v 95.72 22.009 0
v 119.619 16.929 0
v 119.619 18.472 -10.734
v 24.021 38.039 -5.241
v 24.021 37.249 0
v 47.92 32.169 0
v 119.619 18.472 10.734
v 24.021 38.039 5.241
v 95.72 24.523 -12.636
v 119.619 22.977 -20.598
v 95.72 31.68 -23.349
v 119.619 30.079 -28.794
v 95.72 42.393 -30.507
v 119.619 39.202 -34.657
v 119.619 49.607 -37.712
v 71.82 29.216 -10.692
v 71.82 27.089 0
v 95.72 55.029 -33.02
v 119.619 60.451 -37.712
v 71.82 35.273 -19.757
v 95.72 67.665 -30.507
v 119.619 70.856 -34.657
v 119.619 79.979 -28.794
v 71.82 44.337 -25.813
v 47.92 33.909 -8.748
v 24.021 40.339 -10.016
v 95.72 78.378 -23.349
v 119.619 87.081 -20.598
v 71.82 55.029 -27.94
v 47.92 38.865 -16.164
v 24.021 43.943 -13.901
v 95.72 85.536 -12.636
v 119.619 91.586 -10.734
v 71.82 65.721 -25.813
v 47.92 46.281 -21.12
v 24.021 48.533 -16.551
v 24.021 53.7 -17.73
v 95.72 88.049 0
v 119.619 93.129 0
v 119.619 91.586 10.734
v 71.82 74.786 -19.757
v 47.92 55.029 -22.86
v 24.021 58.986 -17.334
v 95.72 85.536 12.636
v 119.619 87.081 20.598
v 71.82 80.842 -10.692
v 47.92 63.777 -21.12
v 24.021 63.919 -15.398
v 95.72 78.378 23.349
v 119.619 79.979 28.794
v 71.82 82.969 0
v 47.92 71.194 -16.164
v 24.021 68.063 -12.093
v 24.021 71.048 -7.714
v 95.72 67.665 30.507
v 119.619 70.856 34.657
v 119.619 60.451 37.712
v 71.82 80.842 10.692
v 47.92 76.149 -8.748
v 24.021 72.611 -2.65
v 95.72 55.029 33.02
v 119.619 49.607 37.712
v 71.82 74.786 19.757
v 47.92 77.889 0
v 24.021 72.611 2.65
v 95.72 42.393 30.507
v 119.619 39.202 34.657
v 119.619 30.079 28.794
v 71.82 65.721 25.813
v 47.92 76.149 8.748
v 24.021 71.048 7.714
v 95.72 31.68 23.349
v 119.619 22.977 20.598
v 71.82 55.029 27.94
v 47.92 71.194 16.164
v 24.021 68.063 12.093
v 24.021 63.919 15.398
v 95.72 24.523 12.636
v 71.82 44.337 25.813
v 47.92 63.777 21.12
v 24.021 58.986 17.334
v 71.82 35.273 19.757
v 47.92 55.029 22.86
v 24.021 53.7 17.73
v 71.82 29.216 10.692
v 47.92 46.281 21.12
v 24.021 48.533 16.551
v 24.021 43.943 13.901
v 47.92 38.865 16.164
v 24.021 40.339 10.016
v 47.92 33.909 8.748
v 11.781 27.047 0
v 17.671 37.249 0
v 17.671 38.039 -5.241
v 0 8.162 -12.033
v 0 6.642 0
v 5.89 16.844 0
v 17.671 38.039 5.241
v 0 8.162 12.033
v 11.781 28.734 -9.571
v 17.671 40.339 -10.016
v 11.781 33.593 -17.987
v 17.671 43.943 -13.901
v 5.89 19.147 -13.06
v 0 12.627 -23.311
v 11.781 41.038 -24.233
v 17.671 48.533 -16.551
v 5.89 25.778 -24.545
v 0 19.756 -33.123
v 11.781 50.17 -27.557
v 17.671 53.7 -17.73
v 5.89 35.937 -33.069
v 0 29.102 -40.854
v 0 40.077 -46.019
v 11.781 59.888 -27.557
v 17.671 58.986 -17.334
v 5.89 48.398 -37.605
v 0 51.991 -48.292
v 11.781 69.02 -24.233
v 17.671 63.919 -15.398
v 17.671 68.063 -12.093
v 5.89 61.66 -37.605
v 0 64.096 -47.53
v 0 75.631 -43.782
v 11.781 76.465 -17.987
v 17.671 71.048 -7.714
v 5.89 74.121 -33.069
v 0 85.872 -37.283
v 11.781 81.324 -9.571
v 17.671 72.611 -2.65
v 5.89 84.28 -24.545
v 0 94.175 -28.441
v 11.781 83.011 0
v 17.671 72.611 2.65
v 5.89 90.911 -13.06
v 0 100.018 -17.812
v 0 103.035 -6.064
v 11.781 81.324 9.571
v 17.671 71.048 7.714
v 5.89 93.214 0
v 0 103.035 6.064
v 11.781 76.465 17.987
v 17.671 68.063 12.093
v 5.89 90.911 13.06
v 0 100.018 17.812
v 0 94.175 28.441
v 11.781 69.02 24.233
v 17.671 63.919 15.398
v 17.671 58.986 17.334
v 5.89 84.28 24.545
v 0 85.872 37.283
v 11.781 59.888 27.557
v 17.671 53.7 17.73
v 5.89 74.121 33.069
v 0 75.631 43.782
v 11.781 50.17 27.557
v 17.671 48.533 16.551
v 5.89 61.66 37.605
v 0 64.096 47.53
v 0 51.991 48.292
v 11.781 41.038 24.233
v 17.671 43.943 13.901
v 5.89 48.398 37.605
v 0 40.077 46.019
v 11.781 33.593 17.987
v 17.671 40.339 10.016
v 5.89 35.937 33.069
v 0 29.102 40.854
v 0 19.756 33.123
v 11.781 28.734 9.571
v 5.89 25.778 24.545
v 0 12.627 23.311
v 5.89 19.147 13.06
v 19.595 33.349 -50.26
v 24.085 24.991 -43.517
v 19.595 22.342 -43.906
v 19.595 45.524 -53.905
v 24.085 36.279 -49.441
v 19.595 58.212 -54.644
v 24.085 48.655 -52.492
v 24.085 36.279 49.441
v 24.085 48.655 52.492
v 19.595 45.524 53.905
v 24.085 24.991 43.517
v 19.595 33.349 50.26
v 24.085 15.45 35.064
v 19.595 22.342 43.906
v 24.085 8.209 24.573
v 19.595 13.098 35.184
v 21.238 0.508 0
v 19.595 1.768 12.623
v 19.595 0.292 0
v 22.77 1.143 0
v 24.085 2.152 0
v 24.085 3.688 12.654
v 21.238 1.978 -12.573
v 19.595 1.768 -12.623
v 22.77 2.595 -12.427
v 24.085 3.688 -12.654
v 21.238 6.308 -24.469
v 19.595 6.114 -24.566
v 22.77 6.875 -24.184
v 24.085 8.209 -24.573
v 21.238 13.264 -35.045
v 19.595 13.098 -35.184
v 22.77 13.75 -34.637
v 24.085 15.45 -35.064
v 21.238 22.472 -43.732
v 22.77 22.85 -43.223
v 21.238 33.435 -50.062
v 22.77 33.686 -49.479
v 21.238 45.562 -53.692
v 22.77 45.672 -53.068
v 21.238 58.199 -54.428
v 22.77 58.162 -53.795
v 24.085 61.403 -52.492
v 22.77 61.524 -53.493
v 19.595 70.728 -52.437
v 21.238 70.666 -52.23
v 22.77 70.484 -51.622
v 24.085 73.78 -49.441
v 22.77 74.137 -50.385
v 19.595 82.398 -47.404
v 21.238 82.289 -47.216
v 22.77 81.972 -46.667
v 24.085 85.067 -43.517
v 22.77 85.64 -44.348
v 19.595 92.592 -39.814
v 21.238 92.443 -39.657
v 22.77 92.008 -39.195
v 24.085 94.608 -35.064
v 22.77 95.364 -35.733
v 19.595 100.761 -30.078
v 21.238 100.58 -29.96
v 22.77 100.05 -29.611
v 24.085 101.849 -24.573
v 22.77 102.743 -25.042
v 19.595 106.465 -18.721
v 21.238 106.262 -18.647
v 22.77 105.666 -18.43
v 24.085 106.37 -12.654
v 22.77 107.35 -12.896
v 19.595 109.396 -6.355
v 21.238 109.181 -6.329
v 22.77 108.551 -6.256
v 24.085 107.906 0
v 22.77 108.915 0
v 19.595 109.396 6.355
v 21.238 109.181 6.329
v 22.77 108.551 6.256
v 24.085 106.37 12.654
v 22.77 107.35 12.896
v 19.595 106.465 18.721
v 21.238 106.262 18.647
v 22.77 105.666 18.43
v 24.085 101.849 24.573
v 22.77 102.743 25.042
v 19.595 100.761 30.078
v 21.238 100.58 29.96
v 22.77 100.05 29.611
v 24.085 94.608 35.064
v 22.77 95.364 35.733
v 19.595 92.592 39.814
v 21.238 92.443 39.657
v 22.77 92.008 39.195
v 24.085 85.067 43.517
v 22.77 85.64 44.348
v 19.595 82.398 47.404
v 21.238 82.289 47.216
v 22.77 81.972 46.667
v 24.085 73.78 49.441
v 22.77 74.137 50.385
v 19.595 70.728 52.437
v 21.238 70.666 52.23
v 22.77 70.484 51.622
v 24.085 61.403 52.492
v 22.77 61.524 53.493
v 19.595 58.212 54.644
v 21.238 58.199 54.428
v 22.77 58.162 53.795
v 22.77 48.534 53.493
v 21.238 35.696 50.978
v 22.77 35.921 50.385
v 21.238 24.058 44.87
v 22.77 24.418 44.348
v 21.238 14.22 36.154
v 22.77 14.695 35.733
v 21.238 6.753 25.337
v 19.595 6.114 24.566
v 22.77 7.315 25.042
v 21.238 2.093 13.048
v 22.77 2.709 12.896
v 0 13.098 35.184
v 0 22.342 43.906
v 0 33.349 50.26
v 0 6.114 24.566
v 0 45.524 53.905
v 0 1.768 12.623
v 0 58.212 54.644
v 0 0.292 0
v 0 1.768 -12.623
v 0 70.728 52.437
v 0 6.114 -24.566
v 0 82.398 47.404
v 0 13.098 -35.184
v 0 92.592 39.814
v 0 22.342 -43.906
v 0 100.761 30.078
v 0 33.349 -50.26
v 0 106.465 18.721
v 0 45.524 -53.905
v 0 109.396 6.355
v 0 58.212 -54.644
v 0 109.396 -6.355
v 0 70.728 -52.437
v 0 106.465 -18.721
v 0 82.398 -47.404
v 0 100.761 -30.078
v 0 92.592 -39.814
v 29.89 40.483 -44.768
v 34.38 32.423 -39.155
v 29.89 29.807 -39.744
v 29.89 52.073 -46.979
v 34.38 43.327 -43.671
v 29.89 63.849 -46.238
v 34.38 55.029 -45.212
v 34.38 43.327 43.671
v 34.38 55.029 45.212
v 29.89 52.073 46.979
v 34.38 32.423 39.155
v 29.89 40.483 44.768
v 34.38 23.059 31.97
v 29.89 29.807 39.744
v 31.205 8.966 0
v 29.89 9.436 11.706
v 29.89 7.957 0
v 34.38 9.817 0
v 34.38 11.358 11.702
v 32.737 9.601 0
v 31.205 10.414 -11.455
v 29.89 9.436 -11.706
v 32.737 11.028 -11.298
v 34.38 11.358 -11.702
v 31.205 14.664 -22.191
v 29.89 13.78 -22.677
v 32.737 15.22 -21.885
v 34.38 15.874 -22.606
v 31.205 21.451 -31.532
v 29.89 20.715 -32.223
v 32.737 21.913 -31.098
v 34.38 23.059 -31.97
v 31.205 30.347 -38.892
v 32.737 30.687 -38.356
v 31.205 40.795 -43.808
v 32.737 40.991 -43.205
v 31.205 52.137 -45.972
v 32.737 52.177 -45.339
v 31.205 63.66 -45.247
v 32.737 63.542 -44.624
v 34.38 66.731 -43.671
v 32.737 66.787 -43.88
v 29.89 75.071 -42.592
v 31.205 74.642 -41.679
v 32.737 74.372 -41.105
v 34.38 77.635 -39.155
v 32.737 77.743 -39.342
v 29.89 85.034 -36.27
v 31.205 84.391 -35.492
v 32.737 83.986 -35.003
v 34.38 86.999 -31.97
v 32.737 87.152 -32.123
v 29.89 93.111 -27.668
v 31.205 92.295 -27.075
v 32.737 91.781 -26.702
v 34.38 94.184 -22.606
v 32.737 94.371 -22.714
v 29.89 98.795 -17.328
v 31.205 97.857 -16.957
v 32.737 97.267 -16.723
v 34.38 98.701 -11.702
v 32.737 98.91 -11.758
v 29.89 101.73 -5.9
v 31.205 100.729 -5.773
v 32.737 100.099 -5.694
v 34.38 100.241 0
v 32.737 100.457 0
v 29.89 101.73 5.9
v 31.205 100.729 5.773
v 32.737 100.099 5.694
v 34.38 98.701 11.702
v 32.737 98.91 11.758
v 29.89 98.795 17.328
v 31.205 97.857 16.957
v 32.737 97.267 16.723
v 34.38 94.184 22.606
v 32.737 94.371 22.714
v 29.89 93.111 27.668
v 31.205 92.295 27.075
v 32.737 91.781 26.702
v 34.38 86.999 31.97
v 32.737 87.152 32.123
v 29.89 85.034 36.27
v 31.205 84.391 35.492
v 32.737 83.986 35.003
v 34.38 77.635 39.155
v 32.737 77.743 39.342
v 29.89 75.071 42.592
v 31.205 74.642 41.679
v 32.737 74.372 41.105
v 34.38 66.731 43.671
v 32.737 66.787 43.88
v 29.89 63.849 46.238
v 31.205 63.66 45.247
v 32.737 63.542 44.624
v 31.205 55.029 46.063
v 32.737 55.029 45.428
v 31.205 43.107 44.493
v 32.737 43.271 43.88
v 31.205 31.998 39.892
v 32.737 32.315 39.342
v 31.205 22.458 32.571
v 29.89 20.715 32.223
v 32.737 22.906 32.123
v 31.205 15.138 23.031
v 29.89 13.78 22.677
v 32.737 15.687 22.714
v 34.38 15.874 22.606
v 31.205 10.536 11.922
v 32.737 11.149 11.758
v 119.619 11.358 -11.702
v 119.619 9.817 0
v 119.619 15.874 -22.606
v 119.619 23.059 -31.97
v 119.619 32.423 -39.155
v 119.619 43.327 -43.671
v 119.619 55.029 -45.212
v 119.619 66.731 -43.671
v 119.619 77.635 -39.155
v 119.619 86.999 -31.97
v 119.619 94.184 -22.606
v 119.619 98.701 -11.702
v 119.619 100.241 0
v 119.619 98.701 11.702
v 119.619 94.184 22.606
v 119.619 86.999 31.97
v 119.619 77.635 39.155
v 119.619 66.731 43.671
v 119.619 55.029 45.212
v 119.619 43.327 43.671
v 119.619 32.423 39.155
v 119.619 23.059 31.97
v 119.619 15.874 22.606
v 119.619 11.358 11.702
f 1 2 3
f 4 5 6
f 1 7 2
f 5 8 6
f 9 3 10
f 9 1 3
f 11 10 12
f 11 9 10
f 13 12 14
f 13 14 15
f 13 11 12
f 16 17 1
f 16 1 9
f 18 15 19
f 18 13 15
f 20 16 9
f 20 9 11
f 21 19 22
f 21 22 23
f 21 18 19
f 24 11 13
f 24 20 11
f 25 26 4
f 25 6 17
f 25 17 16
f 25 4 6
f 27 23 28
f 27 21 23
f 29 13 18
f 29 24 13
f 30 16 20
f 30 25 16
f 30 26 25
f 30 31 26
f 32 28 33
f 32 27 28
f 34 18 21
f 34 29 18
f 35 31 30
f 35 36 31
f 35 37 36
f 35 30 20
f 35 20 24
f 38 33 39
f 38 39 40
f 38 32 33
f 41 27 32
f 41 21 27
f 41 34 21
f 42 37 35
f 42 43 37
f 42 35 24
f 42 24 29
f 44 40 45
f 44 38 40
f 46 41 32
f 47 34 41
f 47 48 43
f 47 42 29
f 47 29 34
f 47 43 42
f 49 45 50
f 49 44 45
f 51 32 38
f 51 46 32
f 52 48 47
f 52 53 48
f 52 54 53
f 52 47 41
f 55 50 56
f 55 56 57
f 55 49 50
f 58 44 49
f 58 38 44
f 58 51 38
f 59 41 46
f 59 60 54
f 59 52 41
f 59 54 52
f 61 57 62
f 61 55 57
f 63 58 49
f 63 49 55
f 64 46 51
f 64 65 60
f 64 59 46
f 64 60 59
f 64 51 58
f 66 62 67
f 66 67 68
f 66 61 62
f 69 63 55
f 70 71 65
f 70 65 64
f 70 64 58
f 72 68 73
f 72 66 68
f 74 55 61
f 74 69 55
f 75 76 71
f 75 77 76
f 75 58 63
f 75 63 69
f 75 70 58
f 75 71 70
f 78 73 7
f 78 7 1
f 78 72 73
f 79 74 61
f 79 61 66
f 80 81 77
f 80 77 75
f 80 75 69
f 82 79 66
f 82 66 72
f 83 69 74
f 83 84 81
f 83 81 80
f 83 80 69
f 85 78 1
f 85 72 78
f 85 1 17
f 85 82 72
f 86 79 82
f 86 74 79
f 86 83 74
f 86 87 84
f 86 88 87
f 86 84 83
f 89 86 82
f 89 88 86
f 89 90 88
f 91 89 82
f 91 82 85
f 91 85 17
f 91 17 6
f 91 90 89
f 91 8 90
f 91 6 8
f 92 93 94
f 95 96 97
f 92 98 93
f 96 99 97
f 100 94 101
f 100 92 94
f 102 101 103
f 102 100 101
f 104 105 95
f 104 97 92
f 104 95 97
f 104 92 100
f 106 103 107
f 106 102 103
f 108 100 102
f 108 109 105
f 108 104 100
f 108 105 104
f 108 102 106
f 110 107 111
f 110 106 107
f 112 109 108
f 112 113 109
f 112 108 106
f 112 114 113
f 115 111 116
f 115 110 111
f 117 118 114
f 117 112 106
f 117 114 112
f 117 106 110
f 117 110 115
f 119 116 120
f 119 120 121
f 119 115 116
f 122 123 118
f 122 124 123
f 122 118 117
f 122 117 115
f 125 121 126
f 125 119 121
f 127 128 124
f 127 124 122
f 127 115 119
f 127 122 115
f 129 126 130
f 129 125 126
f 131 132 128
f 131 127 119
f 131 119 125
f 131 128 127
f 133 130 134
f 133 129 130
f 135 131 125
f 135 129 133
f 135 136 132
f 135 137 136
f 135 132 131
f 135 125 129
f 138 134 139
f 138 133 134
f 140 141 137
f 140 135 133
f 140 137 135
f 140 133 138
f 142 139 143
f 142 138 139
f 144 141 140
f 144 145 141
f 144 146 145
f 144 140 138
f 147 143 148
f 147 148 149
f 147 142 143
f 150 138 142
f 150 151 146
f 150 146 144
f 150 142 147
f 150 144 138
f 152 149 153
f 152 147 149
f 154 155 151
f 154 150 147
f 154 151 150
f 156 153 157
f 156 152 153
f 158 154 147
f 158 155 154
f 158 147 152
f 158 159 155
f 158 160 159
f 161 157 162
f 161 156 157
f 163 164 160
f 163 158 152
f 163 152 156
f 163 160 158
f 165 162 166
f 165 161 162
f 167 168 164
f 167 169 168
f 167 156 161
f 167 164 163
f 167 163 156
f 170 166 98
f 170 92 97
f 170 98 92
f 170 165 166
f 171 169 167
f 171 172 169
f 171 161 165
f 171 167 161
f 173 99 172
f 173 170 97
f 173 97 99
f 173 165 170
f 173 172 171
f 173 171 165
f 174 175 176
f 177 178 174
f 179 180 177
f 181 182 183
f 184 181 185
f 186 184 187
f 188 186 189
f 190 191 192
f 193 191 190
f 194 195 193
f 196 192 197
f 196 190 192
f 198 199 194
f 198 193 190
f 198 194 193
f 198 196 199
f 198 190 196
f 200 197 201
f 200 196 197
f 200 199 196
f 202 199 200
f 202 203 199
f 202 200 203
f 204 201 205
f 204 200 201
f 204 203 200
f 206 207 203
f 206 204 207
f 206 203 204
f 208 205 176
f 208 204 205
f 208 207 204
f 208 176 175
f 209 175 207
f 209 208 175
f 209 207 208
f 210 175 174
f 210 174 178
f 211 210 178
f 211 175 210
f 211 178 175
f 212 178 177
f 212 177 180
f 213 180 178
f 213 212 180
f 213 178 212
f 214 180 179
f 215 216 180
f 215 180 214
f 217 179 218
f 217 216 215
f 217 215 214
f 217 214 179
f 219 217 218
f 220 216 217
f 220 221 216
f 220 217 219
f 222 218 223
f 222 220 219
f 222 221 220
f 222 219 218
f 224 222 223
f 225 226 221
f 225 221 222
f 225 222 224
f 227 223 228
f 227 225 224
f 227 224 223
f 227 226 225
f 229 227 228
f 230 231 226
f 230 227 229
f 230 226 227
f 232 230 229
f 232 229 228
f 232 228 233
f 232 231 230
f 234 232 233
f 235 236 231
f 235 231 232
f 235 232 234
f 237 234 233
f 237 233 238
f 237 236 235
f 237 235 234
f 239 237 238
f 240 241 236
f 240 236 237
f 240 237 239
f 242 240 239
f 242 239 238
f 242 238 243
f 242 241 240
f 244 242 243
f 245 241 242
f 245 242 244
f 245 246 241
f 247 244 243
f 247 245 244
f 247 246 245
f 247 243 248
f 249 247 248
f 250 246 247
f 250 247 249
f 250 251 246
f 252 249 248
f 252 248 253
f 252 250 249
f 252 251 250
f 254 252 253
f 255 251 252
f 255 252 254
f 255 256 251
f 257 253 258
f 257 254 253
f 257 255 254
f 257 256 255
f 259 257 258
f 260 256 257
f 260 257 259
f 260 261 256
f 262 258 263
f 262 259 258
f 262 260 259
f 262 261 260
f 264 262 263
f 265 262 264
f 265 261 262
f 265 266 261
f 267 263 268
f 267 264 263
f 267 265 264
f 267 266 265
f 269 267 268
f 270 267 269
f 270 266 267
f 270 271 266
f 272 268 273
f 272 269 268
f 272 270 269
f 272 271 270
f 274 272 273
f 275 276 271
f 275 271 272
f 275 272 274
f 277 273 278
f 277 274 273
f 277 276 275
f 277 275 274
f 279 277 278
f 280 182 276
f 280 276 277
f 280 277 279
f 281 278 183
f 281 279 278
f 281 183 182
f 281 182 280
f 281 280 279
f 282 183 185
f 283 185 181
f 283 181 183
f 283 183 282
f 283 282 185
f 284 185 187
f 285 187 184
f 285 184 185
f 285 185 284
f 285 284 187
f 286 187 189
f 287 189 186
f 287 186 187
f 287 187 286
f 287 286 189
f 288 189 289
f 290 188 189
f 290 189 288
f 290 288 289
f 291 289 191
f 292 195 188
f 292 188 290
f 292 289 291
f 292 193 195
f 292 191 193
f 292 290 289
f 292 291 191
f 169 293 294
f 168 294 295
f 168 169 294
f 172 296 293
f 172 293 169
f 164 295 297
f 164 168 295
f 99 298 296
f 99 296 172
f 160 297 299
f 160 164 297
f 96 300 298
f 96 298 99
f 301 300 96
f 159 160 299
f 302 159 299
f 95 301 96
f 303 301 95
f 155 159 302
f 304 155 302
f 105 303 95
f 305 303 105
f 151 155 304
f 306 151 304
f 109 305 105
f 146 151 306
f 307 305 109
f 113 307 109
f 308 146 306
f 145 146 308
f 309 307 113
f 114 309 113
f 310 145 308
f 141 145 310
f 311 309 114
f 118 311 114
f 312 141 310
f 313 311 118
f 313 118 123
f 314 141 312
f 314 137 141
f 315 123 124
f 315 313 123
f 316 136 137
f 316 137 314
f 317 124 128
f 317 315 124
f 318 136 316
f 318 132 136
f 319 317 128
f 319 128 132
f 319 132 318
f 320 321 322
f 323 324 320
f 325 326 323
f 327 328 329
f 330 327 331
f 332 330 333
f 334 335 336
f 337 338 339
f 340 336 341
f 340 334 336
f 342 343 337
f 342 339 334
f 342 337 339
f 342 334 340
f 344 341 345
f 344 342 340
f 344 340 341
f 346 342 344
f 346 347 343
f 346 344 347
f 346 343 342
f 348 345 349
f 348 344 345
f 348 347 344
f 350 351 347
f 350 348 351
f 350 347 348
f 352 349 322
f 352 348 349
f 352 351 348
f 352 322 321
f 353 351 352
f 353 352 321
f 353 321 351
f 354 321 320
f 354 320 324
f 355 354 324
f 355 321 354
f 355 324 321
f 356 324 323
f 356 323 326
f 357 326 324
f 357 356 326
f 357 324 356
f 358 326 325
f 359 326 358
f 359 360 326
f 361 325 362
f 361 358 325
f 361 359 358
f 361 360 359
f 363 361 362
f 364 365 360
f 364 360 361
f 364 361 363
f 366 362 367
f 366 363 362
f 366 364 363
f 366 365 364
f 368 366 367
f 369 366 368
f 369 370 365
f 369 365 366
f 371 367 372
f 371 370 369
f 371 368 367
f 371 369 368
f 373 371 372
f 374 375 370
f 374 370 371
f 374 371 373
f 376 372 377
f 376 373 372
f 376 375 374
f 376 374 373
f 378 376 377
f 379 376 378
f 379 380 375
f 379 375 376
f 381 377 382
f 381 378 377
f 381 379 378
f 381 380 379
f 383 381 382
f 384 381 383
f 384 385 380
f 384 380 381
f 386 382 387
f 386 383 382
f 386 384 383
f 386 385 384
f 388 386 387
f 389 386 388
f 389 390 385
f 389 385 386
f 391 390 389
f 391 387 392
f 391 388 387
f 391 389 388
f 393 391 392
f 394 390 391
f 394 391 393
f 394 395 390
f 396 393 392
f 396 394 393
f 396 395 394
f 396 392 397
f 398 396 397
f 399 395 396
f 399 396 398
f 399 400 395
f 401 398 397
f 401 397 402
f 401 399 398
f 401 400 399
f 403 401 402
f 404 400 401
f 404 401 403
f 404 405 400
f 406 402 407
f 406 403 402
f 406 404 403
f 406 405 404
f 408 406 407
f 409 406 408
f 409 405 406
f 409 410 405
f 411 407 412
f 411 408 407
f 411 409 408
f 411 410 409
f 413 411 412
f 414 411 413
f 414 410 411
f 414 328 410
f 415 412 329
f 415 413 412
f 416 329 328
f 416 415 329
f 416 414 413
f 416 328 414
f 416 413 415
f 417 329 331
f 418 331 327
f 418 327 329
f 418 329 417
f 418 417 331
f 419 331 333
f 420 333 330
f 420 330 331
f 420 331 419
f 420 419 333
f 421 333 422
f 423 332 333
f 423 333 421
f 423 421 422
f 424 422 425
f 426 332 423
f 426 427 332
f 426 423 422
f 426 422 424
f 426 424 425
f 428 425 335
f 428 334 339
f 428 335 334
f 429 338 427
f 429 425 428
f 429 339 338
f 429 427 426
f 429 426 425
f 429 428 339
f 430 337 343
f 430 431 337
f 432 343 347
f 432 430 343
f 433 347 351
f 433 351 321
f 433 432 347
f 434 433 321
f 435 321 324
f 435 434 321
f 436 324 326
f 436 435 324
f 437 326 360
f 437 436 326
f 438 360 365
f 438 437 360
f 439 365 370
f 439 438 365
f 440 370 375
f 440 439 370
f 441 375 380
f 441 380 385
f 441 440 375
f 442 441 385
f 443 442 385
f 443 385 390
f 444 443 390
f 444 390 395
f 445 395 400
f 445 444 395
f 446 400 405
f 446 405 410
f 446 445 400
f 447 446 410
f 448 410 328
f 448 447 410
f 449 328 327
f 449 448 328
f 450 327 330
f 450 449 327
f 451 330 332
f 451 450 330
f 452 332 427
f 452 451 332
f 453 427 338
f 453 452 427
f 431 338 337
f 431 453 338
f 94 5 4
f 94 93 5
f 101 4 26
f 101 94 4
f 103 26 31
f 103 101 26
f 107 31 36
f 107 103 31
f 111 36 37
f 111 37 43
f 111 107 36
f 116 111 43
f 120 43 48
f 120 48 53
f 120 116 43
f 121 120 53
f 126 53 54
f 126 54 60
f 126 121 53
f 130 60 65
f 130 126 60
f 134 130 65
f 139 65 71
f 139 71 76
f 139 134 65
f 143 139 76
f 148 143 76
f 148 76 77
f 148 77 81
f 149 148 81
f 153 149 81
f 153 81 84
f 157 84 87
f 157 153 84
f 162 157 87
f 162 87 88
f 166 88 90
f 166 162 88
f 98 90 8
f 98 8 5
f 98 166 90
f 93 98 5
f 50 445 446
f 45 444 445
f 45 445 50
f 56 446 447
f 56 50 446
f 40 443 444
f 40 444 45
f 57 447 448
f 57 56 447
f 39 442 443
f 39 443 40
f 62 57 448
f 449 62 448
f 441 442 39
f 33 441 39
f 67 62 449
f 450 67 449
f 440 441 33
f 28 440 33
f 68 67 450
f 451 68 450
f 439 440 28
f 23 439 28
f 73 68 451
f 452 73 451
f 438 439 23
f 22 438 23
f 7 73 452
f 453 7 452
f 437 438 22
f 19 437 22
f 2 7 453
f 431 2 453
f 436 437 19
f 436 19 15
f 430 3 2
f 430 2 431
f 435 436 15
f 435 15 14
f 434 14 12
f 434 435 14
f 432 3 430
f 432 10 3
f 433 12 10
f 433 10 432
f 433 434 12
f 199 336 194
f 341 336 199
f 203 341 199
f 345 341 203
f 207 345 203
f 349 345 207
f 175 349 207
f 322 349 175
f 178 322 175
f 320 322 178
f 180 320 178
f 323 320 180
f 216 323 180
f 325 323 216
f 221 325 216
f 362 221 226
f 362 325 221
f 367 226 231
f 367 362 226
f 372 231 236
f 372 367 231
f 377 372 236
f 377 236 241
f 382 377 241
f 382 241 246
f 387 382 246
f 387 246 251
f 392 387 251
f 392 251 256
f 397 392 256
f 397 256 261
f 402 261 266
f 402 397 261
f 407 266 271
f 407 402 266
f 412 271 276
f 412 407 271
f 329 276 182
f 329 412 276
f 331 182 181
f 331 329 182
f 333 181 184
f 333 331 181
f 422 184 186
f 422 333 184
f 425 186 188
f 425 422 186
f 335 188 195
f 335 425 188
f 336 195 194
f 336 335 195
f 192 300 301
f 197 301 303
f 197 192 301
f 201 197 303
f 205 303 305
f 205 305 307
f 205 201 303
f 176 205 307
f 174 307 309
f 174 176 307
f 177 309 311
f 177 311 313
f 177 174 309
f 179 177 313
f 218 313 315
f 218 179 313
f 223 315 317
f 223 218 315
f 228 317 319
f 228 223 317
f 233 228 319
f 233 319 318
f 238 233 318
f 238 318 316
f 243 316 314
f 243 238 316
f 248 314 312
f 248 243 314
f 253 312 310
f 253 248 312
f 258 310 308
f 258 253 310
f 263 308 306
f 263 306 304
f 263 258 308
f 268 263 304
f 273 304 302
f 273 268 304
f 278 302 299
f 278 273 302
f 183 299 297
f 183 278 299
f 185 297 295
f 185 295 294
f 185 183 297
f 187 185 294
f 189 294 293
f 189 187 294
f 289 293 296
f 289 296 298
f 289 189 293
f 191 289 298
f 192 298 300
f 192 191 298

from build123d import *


with BuildPart() as part:
    # Sketch1 → Revolve1 (revolve)
    with BuildSketch(Plane.XY):
        with BuildLine():
            Line((0, 0.2921), (19.594743879, 0.2921))
            ThreePointArc((19.594743879, 0.2921), (22.024783674, 0.775464969), (24.084871939, 2.151971939))
            Line((24.084871939, 2.151971939), (29.890128061, 7.957228061))
            ThreePointArc((29.890128061, 7.957228061), (31.950216326, 9.333735031), (34.380256121, 9.8171))
            Line((34.380256121, 9.8171), (119.619043514, 9.8171))
            Line((119.619043514, 9.8171), (119.619043514, 16.9291))
            Line((119.619043514, 16.9291), (24.020959689, 37.2491))
            Line((24.020959689, 37.2491), (17.670959689, 37.2491))
            Line((17.670959689, 37.2491), (0, 6.6421))
            Line((0, 6.6421), (0, 0.2921))
        make_face()
    revolve(axis=Axis((0, 55.0291, 0), (1, 0, 0)))


solid = part.part
